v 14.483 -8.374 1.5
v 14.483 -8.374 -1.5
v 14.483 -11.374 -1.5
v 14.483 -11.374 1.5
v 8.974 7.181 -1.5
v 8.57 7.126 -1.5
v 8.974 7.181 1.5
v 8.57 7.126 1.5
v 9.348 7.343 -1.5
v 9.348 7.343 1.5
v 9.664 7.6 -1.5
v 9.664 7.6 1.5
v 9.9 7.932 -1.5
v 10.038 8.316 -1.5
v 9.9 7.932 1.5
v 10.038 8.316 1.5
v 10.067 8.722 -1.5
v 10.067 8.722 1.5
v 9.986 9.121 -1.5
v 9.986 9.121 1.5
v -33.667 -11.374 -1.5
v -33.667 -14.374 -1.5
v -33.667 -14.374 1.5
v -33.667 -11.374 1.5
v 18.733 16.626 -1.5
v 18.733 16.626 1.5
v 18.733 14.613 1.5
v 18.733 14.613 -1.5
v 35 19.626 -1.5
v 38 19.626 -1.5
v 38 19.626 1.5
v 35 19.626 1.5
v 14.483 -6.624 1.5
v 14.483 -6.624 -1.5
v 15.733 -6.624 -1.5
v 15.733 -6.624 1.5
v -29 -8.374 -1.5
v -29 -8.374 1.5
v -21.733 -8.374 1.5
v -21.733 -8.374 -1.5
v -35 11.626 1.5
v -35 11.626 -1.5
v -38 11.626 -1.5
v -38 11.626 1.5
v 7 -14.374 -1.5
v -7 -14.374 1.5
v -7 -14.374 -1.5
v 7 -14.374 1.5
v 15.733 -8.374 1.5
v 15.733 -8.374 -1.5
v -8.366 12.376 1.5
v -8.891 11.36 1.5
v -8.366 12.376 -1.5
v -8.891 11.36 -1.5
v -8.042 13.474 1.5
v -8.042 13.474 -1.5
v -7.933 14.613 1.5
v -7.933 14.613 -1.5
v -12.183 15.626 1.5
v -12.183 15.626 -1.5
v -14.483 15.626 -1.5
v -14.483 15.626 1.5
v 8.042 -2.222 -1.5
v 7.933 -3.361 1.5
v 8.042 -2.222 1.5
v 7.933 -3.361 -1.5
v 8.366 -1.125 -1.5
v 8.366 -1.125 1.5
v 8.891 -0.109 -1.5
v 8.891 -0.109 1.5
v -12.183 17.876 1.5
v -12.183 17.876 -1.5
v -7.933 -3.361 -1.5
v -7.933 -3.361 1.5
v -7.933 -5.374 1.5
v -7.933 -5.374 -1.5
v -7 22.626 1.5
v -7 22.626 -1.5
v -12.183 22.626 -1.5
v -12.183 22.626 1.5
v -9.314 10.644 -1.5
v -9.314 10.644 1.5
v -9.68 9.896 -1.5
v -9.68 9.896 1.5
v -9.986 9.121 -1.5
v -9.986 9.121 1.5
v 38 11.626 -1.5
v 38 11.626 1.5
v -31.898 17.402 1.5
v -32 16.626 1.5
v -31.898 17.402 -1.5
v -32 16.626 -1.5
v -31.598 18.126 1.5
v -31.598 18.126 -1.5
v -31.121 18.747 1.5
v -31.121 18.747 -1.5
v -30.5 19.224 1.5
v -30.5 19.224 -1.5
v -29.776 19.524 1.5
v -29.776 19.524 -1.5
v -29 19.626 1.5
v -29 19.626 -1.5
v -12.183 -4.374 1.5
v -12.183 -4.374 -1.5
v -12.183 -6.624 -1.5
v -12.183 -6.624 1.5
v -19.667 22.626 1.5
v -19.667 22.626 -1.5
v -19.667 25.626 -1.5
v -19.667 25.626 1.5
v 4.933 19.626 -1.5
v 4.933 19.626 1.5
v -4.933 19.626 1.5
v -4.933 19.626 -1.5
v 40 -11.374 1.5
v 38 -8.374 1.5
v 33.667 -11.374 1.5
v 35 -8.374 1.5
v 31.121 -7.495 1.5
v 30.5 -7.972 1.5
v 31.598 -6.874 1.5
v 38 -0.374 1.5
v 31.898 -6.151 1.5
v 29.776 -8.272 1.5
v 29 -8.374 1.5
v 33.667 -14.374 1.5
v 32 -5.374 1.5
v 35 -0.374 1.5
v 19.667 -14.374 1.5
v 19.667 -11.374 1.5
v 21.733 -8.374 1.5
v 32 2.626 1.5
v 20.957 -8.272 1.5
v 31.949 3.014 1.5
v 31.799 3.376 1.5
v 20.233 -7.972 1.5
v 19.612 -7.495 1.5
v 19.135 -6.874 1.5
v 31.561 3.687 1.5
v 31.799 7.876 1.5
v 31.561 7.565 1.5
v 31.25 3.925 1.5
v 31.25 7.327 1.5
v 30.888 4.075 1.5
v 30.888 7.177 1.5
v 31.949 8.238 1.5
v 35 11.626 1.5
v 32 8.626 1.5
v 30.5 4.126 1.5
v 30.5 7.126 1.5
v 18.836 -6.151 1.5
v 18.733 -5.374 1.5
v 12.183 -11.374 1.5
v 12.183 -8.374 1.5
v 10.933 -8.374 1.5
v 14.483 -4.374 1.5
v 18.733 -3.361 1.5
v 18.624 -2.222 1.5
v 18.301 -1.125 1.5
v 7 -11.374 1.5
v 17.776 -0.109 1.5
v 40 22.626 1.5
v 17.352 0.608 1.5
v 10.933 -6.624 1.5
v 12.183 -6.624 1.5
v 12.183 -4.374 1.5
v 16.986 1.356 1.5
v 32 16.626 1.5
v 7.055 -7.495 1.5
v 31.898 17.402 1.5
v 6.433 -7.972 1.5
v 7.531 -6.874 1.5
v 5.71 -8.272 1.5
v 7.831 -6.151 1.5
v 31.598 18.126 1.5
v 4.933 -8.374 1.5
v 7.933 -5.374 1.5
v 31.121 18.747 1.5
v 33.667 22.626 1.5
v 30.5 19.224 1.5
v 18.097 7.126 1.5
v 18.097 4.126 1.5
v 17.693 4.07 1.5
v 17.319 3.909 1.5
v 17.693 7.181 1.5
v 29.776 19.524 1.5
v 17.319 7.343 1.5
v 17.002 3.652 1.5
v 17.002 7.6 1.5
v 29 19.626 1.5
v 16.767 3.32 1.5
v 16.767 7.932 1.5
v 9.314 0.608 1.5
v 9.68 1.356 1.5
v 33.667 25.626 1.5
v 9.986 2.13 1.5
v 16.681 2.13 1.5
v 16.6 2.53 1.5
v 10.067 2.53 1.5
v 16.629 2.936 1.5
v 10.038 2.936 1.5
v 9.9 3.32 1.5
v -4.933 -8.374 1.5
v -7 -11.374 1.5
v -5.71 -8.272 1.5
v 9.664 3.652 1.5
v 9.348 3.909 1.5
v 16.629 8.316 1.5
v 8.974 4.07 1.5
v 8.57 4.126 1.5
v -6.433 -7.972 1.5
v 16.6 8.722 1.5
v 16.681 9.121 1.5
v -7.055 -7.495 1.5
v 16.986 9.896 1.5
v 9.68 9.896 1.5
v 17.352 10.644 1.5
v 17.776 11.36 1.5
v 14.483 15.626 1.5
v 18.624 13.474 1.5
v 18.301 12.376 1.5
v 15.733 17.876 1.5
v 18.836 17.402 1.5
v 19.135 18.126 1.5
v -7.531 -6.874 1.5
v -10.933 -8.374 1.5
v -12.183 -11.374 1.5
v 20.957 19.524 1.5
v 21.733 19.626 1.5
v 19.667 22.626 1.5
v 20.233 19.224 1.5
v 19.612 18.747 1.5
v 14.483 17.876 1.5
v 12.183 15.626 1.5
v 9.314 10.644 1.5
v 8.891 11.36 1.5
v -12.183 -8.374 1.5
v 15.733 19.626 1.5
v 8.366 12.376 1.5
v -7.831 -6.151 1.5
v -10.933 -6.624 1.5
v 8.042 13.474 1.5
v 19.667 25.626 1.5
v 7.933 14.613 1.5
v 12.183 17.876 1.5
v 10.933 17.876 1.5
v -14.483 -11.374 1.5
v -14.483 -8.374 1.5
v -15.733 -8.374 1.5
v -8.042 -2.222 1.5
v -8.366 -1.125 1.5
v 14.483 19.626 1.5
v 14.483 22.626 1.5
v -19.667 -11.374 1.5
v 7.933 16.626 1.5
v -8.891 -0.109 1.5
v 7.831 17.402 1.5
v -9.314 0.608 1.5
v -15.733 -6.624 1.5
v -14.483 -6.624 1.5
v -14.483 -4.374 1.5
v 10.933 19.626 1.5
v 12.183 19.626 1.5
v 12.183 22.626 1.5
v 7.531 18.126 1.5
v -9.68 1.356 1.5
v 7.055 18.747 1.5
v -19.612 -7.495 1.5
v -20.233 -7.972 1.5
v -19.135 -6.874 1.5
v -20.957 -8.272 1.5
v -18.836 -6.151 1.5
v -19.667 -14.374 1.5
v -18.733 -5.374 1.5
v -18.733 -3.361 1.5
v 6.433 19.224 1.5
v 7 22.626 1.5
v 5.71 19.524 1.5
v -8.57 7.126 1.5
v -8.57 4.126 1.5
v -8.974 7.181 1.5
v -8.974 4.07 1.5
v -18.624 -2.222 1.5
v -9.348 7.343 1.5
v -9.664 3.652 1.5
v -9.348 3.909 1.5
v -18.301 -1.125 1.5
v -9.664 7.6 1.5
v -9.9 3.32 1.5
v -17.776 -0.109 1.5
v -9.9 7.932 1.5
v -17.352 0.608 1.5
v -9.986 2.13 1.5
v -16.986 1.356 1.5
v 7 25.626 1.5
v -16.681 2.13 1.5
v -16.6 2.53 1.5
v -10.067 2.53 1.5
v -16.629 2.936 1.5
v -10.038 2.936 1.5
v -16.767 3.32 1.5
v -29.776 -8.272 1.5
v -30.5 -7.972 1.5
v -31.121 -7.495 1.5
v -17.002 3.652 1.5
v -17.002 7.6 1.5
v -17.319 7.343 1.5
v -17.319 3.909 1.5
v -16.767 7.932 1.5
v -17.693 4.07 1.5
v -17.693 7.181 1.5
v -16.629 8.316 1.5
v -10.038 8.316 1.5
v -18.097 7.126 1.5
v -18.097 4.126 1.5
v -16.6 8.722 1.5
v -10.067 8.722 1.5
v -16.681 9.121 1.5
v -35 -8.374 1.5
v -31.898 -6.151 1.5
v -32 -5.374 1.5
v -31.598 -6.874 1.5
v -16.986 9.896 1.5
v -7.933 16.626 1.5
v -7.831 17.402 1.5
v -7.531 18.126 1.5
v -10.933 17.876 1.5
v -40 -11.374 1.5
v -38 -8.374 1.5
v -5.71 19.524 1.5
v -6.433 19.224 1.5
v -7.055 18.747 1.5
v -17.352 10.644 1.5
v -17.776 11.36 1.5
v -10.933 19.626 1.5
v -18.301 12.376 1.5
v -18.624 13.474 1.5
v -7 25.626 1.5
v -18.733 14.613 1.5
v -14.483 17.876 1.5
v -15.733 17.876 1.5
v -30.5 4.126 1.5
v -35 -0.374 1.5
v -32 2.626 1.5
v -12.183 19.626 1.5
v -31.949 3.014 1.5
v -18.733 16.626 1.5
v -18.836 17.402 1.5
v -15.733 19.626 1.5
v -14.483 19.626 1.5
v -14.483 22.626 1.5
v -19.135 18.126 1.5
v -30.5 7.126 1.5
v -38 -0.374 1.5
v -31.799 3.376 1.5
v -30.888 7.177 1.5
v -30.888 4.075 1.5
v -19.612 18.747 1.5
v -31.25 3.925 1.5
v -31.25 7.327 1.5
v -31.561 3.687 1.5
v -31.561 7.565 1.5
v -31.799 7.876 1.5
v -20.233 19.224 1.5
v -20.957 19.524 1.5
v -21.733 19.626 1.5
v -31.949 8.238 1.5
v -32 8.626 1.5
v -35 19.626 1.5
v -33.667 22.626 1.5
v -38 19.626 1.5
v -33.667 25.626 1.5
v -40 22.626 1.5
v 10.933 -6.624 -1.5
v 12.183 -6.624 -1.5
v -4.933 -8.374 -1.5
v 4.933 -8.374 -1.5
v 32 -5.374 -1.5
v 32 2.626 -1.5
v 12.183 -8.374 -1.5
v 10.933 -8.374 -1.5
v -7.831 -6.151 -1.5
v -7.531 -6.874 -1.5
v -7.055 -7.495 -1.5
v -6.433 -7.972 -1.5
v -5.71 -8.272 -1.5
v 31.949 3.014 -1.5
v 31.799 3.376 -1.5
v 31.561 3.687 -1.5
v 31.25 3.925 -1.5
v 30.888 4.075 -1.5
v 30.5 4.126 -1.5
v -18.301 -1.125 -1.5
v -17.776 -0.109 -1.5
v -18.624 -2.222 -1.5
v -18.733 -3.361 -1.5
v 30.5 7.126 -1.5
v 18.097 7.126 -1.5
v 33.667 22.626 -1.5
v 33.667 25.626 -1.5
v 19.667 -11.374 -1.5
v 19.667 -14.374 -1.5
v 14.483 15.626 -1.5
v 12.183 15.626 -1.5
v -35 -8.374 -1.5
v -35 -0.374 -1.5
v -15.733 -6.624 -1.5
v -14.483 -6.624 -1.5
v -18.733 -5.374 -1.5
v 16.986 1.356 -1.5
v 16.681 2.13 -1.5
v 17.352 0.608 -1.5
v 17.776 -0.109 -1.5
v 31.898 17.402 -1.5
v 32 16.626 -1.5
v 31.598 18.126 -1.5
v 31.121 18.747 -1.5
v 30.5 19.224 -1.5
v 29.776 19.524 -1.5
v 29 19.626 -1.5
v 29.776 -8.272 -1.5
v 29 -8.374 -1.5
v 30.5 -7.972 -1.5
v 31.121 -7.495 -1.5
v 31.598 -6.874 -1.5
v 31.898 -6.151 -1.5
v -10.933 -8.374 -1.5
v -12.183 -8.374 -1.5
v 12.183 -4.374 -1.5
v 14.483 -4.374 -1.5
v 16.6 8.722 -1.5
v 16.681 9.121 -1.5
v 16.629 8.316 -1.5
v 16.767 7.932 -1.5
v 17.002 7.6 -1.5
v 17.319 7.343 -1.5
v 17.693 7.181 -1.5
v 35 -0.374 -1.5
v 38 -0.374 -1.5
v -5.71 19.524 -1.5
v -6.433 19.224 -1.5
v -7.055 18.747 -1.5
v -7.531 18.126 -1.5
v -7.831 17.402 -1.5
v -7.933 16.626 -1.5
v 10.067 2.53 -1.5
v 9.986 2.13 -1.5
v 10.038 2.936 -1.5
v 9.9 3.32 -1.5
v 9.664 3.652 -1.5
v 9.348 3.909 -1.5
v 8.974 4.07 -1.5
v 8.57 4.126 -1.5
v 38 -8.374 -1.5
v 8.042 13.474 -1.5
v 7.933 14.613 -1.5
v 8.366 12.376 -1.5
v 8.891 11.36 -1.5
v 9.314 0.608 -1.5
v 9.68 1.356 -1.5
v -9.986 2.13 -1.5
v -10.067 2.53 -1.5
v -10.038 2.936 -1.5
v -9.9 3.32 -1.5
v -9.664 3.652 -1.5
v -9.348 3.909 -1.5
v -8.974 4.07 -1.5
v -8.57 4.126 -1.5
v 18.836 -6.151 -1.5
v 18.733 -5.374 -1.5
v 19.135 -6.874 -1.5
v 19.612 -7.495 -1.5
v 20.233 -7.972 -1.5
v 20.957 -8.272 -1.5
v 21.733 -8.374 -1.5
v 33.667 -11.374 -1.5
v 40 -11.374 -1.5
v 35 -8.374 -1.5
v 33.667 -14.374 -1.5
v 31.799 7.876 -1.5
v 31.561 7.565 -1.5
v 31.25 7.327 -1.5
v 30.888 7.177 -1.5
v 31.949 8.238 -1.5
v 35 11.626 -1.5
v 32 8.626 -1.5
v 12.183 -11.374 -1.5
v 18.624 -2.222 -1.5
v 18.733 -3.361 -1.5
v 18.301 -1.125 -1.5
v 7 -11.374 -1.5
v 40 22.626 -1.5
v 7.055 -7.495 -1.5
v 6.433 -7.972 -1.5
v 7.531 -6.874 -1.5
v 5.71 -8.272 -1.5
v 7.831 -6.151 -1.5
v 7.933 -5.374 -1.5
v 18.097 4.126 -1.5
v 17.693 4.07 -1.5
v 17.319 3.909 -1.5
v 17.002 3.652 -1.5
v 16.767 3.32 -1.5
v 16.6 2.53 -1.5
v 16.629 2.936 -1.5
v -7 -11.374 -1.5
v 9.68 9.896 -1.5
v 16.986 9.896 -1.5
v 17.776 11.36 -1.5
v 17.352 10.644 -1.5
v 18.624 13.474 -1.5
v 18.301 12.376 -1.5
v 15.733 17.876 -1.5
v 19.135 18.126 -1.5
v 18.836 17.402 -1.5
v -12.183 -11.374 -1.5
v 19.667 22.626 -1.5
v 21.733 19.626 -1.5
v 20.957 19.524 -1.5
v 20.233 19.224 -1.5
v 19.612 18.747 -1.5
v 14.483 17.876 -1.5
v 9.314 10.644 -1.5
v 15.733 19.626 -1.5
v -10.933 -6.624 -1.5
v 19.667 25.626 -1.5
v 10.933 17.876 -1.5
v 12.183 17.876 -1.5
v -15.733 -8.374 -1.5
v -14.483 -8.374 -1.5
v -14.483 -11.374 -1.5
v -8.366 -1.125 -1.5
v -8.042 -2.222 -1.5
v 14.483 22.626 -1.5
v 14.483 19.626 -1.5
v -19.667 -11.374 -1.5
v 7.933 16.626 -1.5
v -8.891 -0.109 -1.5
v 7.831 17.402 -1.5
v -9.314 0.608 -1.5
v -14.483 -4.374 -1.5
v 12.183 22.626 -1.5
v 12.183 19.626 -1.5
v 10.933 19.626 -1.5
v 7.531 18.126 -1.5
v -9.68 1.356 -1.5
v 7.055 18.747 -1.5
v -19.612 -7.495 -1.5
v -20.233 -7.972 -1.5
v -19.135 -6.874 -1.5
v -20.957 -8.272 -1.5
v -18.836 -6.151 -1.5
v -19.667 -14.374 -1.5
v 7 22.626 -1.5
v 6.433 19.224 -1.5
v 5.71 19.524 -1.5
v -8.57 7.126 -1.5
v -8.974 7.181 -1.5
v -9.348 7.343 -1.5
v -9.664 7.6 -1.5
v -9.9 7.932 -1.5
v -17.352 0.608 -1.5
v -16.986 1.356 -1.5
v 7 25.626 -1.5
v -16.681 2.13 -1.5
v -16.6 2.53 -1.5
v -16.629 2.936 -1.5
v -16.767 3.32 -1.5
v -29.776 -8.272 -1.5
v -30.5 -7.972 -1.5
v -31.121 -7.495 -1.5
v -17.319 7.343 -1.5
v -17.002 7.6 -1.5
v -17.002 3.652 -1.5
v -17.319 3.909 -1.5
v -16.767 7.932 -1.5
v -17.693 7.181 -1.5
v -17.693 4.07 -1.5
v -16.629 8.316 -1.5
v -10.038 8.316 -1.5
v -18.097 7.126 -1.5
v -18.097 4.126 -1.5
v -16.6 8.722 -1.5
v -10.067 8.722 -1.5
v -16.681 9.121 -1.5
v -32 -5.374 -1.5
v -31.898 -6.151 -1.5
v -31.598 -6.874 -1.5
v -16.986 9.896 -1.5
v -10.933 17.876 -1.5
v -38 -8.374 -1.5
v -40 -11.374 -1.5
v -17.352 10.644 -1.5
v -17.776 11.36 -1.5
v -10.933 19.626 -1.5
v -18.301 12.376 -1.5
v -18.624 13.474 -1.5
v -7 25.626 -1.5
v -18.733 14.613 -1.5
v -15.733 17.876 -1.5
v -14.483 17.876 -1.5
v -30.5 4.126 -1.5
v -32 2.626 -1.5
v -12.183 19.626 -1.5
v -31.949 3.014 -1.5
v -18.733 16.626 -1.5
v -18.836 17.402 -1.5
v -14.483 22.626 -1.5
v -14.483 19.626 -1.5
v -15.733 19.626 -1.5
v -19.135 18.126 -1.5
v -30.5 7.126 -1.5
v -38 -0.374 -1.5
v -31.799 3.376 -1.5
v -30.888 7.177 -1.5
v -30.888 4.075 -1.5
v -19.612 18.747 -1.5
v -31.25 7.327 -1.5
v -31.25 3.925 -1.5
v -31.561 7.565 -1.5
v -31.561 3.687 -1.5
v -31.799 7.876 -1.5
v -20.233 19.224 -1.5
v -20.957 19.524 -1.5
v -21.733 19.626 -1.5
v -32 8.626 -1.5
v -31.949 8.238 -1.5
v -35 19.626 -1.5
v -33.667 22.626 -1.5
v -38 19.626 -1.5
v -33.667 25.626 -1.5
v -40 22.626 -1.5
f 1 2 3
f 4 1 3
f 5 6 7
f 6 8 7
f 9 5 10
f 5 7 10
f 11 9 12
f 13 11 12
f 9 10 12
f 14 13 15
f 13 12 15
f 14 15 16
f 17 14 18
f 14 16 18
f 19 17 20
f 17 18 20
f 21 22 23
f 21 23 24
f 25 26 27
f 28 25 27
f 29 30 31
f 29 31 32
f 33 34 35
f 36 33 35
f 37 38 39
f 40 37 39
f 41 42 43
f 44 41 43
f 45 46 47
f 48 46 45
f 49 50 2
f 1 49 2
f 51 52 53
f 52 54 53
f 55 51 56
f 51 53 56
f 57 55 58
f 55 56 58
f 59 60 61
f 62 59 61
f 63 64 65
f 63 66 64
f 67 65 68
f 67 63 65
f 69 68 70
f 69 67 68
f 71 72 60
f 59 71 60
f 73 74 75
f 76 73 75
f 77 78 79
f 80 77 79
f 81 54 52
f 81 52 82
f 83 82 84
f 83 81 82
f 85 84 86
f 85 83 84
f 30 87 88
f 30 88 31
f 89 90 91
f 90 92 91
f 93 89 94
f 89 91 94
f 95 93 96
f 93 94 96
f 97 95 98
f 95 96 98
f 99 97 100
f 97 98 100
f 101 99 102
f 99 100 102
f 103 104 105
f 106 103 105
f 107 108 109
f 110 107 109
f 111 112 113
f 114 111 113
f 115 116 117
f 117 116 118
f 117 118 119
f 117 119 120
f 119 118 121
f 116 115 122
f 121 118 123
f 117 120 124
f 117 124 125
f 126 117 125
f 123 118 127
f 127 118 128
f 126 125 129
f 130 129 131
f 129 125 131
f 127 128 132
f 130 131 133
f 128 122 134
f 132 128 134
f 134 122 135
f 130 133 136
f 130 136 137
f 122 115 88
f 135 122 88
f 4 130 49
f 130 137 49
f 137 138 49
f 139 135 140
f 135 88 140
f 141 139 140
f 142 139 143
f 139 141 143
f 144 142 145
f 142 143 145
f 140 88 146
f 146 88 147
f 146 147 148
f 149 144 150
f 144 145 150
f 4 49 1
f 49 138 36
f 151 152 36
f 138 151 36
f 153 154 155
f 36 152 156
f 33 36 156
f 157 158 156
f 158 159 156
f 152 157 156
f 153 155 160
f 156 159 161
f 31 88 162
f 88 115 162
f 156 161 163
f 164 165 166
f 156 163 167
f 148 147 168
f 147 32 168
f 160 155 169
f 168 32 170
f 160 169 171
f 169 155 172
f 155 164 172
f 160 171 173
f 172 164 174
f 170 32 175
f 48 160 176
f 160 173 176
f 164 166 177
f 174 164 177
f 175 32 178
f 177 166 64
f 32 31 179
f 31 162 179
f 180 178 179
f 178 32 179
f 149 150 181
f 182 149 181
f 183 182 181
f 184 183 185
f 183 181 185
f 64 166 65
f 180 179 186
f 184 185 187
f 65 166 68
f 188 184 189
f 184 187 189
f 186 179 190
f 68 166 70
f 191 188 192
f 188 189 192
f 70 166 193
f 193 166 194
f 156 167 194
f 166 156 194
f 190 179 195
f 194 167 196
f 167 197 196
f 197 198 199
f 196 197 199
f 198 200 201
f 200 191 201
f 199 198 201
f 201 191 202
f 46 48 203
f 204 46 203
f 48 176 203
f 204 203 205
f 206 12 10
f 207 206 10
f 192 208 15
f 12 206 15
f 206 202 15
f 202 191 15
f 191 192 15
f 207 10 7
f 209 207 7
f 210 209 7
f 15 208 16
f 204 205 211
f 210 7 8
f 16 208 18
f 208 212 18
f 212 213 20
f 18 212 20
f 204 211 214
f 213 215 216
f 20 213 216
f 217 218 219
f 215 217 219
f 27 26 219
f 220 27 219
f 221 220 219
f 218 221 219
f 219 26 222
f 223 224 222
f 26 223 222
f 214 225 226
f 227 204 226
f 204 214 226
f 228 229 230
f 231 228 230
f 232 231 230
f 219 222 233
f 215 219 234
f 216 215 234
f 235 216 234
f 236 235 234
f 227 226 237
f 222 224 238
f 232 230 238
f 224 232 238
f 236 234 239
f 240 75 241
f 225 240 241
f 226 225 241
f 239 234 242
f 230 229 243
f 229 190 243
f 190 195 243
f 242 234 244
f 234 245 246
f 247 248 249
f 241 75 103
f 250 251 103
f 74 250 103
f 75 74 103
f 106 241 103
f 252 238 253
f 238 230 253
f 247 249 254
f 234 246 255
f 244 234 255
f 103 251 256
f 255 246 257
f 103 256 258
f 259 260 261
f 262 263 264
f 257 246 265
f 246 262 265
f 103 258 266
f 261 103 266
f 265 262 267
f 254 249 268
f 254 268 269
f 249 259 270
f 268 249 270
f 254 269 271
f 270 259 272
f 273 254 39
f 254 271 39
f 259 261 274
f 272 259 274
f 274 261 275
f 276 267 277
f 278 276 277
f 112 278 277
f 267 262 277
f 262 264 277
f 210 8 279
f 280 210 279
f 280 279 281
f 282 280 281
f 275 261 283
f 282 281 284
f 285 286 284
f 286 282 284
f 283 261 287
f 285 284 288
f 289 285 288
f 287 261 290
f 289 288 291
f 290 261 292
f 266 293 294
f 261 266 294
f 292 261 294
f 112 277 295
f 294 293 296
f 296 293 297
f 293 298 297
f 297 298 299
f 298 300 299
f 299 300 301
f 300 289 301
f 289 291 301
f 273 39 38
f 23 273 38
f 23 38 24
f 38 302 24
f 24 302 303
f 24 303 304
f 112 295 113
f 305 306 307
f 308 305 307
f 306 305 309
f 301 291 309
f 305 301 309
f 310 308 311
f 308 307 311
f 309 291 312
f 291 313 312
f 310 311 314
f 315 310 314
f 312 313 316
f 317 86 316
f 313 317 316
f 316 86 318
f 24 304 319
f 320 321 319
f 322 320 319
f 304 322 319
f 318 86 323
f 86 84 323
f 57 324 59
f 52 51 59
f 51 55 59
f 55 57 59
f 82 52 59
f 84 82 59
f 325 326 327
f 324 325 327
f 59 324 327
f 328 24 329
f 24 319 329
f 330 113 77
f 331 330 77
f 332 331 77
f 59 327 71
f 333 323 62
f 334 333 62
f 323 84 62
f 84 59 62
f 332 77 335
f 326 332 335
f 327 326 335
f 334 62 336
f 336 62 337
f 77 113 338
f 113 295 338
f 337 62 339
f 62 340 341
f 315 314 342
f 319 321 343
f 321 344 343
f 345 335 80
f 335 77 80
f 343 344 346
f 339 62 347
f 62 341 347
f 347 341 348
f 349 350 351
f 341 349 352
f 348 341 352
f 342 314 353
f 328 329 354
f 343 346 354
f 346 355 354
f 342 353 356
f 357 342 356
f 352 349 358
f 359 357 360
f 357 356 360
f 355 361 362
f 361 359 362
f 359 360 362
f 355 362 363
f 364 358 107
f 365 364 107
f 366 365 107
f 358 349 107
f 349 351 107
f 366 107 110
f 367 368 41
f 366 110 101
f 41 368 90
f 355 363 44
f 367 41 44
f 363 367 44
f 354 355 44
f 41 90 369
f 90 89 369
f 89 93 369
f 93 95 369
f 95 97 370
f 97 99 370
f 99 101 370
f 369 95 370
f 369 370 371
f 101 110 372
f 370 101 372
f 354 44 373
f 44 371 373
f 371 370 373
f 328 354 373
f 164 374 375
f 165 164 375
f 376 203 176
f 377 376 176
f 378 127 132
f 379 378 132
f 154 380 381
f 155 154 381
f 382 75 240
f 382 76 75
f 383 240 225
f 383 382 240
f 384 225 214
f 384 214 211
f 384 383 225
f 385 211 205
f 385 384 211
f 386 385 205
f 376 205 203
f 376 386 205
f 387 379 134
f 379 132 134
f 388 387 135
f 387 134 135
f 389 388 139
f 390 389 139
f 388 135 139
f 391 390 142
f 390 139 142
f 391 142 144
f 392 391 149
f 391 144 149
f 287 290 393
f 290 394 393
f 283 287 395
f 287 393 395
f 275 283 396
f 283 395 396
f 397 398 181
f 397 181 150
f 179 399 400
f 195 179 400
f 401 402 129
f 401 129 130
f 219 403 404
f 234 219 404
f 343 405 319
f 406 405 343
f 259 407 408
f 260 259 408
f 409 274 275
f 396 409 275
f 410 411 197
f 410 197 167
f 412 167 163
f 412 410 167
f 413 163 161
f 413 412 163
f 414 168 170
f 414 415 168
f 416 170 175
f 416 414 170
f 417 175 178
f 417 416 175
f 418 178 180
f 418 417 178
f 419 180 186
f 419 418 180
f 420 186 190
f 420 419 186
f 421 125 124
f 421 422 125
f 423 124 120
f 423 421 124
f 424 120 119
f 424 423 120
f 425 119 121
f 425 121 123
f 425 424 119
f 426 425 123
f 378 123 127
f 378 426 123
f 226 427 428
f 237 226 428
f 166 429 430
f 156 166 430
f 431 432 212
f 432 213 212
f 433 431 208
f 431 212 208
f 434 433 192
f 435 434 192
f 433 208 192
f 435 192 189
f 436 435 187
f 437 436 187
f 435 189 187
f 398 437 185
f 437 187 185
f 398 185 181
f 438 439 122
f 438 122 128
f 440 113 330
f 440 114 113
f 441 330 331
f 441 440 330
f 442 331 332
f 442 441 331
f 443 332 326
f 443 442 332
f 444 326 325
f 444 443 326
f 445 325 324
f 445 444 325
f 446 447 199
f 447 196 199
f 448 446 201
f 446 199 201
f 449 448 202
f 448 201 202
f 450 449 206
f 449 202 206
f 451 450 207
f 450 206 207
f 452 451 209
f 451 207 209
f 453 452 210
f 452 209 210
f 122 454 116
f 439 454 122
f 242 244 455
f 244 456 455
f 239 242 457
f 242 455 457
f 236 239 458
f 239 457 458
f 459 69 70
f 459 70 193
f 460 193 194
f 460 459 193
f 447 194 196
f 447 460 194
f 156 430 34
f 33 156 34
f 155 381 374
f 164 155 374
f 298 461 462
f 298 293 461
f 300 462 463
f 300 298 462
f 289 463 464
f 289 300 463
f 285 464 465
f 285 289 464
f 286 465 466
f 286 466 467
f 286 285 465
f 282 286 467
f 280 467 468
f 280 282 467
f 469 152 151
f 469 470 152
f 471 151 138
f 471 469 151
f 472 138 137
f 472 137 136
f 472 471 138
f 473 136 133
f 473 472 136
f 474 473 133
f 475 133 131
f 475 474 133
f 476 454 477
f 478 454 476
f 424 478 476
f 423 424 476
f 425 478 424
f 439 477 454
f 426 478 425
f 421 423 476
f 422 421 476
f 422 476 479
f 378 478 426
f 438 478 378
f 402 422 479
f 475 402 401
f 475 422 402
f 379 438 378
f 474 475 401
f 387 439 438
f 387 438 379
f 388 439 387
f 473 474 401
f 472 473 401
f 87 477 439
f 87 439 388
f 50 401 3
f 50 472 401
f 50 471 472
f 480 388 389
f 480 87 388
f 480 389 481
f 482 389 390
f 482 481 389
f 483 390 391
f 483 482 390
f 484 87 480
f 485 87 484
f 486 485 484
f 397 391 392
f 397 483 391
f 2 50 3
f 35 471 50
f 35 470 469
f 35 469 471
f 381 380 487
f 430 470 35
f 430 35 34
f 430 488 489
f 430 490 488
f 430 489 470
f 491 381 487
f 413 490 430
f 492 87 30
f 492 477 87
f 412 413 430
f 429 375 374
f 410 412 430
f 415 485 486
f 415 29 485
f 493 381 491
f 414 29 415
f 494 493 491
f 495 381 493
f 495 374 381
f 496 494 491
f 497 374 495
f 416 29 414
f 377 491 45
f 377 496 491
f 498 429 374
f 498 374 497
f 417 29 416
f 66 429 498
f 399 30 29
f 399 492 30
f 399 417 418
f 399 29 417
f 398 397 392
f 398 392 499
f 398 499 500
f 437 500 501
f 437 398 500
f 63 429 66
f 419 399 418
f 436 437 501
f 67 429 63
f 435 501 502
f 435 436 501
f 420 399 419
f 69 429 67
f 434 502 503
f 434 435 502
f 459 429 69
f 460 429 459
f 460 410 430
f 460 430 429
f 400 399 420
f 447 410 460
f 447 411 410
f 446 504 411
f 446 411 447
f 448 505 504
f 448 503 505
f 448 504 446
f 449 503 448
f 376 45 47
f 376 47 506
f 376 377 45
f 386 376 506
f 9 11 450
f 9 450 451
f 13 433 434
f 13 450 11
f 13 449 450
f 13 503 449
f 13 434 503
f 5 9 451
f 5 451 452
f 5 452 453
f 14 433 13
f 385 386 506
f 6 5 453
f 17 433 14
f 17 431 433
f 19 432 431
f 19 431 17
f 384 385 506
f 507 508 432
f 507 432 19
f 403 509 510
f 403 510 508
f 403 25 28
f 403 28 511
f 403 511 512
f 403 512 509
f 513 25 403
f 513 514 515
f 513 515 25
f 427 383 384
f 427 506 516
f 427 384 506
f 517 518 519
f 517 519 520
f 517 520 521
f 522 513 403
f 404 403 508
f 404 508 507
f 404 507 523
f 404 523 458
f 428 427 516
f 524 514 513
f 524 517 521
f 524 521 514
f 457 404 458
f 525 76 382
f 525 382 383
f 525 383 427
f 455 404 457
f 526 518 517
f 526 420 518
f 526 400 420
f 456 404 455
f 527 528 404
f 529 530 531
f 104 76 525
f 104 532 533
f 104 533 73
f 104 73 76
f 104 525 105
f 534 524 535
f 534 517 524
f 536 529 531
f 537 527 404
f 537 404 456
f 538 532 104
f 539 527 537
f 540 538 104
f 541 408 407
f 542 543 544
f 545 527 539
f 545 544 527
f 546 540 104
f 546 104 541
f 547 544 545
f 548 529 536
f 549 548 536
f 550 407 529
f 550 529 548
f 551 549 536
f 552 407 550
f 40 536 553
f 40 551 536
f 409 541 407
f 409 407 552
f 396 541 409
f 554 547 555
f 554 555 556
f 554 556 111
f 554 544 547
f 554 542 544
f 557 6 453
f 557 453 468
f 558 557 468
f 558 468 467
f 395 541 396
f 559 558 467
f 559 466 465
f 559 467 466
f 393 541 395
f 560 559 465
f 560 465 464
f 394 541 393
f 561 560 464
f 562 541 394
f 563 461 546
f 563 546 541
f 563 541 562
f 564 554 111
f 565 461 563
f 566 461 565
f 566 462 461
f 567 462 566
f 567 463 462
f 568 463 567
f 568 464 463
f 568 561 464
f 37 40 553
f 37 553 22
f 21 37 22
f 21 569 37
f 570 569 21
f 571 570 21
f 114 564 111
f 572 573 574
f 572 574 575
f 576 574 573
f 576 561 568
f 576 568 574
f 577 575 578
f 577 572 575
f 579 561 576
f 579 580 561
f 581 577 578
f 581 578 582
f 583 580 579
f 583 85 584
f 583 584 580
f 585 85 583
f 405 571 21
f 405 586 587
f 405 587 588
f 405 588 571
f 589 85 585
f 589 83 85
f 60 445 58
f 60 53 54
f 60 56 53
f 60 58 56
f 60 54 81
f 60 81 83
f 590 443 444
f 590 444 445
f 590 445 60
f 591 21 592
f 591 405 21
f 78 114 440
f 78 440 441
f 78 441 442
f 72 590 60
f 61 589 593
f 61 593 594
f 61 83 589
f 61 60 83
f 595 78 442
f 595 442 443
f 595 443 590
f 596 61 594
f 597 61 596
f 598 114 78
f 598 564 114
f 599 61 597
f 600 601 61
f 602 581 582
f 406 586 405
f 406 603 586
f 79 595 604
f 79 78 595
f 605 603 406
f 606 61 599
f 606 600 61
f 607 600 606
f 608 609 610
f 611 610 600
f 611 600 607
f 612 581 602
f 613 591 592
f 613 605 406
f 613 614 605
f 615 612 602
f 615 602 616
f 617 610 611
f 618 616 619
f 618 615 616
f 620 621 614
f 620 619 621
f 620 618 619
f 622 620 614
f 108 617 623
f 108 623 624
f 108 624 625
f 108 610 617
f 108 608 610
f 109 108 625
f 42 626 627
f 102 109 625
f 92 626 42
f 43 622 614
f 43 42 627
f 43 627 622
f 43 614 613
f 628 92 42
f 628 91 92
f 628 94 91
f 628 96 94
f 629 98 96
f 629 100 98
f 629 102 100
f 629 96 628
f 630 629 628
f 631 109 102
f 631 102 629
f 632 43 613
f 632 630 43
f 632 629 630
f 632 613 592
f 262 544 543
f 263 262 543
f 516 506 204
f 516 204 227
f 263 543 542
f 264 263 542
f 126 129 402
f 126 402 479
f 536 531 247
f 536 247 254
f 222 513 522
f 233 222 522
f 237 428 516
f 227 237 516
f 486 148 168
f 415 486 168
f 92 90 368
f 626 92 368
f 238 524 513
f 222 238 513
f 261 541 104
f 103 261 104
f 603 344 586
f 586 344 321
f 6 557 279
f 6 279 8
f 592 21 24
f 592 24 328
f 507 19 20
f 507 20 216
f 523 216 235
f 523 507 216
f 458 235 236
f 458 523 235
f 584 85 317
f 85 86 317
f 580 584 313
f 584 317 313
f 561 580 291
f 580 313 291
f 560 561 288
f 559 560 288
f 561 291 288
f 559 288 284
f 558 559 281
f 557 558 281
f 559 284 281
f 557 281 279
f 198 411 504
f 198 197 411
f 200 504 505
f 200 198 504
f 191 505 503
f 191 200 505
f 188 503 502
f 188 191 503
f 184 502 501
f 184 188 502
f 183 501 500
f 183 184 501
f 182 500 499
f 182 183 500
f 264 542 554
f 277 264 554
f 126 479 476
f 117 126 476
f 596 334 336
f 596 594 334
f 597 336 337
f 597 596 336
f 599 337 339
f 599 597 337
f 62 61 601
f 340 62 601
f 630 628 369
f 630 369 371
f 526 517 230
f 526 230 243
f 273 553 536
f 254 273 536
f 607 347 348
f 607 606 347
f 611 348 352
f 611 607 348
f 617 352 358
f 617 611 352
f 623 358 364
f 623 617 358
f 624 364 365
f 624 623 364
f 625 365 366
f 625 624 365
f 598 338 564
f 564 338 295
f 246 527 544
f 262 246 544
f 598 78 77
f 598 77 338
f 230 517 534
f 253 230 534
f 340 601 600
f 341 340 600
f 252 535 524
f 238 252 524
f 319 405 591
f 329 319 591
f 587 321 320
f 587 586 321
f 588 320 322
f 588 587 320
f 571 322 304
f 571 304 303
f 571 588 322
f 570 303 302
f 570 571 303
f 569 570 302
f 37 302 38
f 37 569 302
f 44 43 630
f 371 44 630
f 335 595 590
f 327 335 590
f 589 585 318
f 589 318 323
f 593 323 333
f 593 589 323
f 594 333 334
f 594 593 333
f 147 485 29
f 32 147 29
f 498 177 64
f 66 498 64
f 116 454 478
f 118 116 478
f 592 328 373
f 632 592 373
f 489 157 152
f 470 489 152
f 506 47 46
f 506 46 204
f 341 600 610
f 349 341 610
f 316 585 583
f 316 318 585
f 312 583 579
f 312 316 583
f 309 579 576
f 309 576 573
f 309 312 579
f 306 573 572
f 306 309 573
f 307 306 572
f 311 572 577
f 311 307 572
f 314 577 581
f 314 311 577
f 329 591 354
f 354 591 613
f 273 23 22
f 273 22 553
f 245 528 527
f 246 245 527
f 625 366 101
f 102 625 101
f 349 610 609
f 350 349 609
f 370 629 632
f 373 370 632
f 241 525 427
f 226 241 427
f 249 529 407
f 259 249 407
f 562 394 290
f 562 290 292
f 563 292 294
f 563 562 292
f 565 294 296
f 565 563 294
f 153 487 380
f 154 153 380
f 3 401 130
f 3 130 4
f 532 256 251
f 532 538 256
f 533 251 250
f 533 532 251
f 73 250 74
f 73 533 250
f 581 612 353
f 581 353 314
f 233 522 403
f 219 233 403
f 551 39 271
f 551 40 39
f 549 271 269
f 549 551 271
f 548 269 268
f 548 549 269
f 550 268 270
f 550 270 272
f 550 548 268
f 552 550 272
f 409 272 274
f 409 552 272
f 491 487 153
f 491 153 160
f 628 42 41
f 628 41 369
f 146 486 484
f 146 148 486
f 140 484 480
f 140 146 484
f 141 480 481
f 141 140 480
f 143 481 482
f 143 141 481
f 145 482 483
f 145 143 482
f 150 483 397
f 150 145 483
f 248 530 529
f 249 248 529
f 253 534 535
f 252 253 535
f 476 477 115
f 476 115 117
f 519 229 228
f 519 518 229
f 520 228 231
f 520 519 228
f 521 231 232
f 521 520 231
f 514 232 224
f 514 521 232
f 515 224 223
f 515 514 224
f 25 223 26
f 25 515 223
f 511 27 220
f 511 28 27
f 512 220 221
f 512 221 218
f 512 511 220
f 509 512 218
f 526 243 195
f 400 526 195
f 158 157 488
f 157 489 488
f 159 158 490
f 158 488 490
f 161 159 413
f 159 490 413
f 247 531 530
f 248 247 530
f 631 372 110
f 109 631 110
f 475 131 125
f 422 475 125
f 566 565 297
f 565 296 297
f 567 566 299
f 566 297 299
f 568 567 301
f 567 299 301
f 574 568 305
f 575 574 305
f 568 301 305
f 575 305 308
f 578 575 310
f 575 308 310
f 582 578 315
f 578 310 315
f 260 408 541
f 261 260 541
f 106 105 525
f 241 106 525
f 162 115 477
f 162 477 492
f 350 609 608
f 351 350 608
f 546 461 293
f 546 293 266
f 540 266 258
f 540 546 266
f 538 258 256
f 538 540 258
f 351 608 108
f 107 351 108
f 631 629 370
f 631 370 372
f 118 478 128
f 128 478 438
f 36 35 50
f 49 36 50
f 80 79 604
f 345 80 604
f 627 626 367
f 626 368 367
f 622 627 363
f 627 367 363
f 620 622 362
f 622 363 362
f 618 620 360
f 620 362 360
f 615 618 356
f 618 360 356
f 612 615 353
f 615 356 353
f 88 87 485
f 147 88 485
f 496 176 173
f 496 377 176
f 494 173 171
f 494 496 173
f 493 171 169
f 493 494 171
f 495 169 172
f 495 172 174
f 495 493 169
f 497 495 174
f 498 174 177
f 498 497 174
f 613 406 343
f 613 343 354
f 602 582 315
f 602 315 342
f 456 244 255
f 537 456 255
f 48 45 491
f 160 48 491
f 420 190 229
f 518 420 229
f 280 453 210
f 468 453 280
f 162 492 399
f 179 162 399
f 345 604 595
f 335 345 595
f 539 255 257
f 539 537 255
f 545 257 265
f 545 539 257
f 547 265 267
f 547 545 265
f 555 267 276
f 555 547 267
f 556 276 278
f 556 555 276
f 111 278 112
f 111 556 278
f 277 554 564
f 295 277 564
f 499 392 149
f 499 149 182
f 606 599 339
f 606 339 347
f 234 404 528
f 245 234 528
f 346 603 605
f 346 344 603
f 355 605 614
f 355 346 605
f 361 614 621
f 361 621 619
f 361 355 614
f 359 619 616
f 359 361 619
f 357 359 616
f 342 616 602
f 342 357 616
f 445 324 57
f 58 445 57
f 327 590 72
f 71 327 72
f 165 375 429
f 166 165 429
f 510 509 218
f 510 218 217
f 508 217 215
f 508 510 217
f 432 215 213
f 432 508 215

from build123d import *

# Parameters (mm, degrees)
SKETCH1_W           = 80
SKETCH1_H           = 40
BOSS_EXTRUDE1_DEPTH = 1.5
SKETCH3_W           = 6.333333333
SKETCH3_H           = 3
SKETCH3_W_2         = 12.666666667
CUT_EXTRUDE1_DEPTH  = 3
CUT_EXTRUDE3_DEPTH  = 3
SKETCH5_W           = 3
SKETCH5_H           = 8
CUT_EXTRUDE4_DEPTH  = 3
CUT_EXTRUDE6_DEPTH  = 3
FILLET1_R           = 3
BOSS_EXTRUDE2_START = -3
BOSS_EXTRUDE2_DEPTH = 3
FILLET2_R           = 6
BOSS_EXTRUDE3_START = -3
BOSS_EXTRUDE3_DEPTH = 3
FILLET3_R           = 1.5


with BuildPart() as part:
    # Sketch1 → Boss-Extrude1 (new body, symmetric)
    with BuildSketch(Plane.XY):
        with Locations((0, 5.625841184)):
            Rectangle(SKETCH1_W, SKETCH1_H)
    extrude(amount=BOSS_EXTRUDE1_DEPTH, both=True)

    # Sketch3 → Cut-Extrude1 (cut)
    with BuildSketch(Plane(origin=(0, 0, -1.5), x_dir=(-1, 0, 0), z_dir=(0, 0, -1))):
        with Locations((-36.833333334, 24.125841184)):
            Rectangle(SKETCH3_W, SKETCH3_H)
        with Locations((-13.333333334, 24.125841184)):
            Rectangle(SKETCH3_W_2, SKETCH3_H)
        with Locations((13.333333334, 24.125841184)):
            Rectangle(SKETCH3_W_2, SKETCH3_H)
        with Locations((36.833333334, 24.125841184)):
            Rectangle(SKETCH3_W, SKETCH3_H)
        with Locations((-36.833333334, -12.874158816)):
            Rectangle(SKETCH3_W, SKETCH3_H)
        with Locations((-13.333333334, -12.874158816)):
            Rectangle(SKETCH3_W_2, SKETCH3_H)
        with Locations((36.833333334, -12.874158816)):
            Rectangle(SKETCH3_W, SKETCH3_H)
        with Locations((13.333333334, -12.874158816)):
            Rectangle(SKETCH3_W_2, SKETCH3_H)
    extrude(amount=-CUT_EXTRUDE1_DEPTH, mode=Mode.SUBTRACT)

    # Sketch4 → Cut-Extrude3 (cut)
    with BuildSketch(Plane(origin=(0, 0, -1.5), x_dir=(-1, 0, 0), z_dir=(0, 0, -1))):
        Polygon((10.933333333, 17.875841184), (12.183333333, 17.875841184), (12.183333333, 15.625841184), (14.483333333, 15.625841184), (14.483333333, 17.875841184), (15.733333333, 17.875841184), (15.733333333, 19.625841184), (14.483333333, 19.625841184), (14.483333333, 22.625841184), (12.183333333, 22.625841184), (12.183333333, 19.625841184), (10.933333333, 19.625841184), align=None)
        Polygon((-12.183333333, 22.625841184), (-14.483333333, 22.625841184), (-14.483333333, 19.625841184), (-15.733333333, 19.625841184), (-15.733333333, 17.875841184), (-14.483333333, 17.875841184), (-14.483333333, 15.625841184), (-12.183333333, 15.625841184), (-12.183333333, 17.875841184), (-10.933333333, 17.875841184), (-10.933333333, 19.625841184), (-12.183333333, 19.625841184), align=None)
        Polygon((-10.933333333, -6.624158816), (-12.183333333, -6.624158816), (-12.183333333, -4.374158816), (-14.483333333, -4.374158816), (-14.483333333, -6.624158816), (-15.733333333, -6.624158816), (-15.733333333, -8.374158816), (-14.483333333, -8.374158816), (-14.483333333, -11.374158816), (-12.183333333, -11.374158816), (-12.183333333, -8.374158816), (-10.933333333, -8.374158816), align=None)
        Polygon((12.183333333, -11.374158816), (14.483333333, -11.374158816), (14.483333333, -8.374158816), (15.733333333, -8.374158816), (15.733333333, -6.624158816), (14.483333333, -6.624158816), (14.483333333, -4.374158816), (12.183333333, -4.374158816), (12.183333333, -6.624158816), (10.933333333, -6.624158816), (10.933333333, -8.374158816), (12.183333333, -8.374158816), align=None)
    extrude(amount=-CUT_EXTRUDE3_DEPTH, mode=Mode.SUBTRACT)

    # Sketch5 → Cut-Extrude4 (cut)
    with BuildSketch(Plane(origin=(0, 0, -1.5), x_dir=(-1, 0, 0), z_dir=(0, 0, -1))):
        with Locations((36.5, -4.374158816)):
            Rectangle(SKETCH5_W, SKETCH5_H)
        with Locations((36.5, 15.625841184)):
            Rectangle(SKETCH5_W, SKETCH5_H)
        with Locations((-36.5, 15.625841184)):
            Rectangle(SKETCH5_W, SKETCH5_H)
        with Locations((-36.5, -4.374158816)):
            Rectangle(SKETCH5_W, SKETCH5_H)
    extrude(amount=-CUT_EXTRUDE4_DEPTH, mode=Mode.SUBTRACT)

    # Sketch7 → Cut-Extrude6 (cut)
    with BuildSketch(Plane.XY.offset(1.5)):
        Polygon((-32, 19.625841184), (-32, -8.374158816), (-18.733333333, -8.374158816), (-18.733333333, -1.374158816), (-7.933333333, -1.374158816), (-7.933333333, -8.374158816), (7.933333333, -8.374158816), (7.933333333, -1.374158816), (18.733333333, -1.374158816), (18.733333333, -8.374158816), (32, -8.374158816), (32, 19.625841184), (18.733333333, 19.625841184), (18.733333333, 12.625841184), (7.933333333, 12.625841184), (7.933333333, 19.625841184), (-7.933333333, 19.625841184), (-7.933333333, 12.625841184), (-18.733333333, 12.625841184), (-18.733333333, 19.625841184), align=None)
    extrude(amount=-CUT_EXTRUDE6_DEPTH, mode=Mode.SUBTRACT)

    # Fillet1
    fillet1_edges = [part.edges().sort_by_distance(p)[0] for p in [
        (-32, 19.625841184, 0),
        (-18.733333333, 19.625841184, 0),
        (-7.933333333, 19.625841184, 0),
        (7.933333333, 19.625841184, 0),
        (18.733333333, 19.625841184, 0),
        (32, 19.625841184, 0),
        (32, -8.374158816, 0),
        (18.733333333, -8.374158816, 0),
        (7.933333333, -8.374158816, 0),
        (-7.933333333, -8.374158816, 0),
        (-18.733333333, -8.374158816, 0),
        (-32, -8.374158816, 0),
    ]]
    fillet(fillet1_edges, radius=FILLET1_R)

    # Sketch8 → Boss-Extrude2 (add)
    with BuildSketch(Plane.XY.offset(1.5).offset(BOSS_EXTRUDE2_START)):
        with BuildLine():
            Line((-18.733333333, 12.625841184), (-7.933333333, 12.625841184))
            ThreePointArc((-7.933333333, 12.625841184), (-10.580065112, 5.625841184), (-7.933333333, -1.374158816))
            Line((-7.933333333, -1.374158816), (-18.733333333, -1.374158816))
            ThreePointArc((-18.733333333, -1.374158816), (-16.086601554, 5.625841184), (-18.733333333, 12.625841184))
        make_face()
        with BuildLine():
            Line((7.933333333, 12.625841184), (18.733333333, 12.625841184))
            ThreePointArc((18.733333333, 12.625841184), (16.086601554, 5.625841184), (18.733333333, -1.374158816))
            Line((18.733333333, -1.374158816), (7.933333333, -1.374158816))
            ThreePointArc((7.933333333, -1.374158816), (10.580065112, 5.625841184), (7.933333333, 12.625841184))
        make_face()
    extrude(amount=BOSS_EXTRUDE2_DEPTH)

    # Fillet2
    fillet2_edges = [part.edges().sort_by_distance(p)[0] for p in [
        (-18.733333333, 12.625841184, 0),
        (-7.933333333, 12.625841184, 0),
        (7.933333333, 12.625841184, 0),
        (18.733333333, 12.625841184, 0),
        (18.733333333, -1.374158816, 0),
        (7.933333333, -1.374158816, 0),
        (-7.933333333, -1.374158816, 0),
        (-18.733333333, -1.374158816, 0),
    ]]
    fillet(fillet2_edges, radius=FILLET2_R)

    # Sketch9 → Boss-Extrude3 (add)
    with BuildSketch(Plane.XY.offset(1.5).offset(BOSS_EXTRUDE3_START)):
        with BuildLine():
            Line((-32, 7.125841184), (-16.193473372, 7.125841184))
            ThreePointArc((-16.193473372, 7.125841184), (-16.086601554, 5.625841184), (-16.193473372, 4.125841184))
            Line((-16.193473372, 4.125841184), (-32, 4.125841184))
            Line((-32, 4.125841184), (-32, 7.125841184))
        make_face()
        with BuildLine():
            Line((-10.473193294, 7.125841184), (10.473193294, 7.125841184))
            ThreePointArc((10.473193294, 7.125841184), (10.580065112, 5.625841184), (10.473193294, 4.125841184))
            Line((10.473193294, 4.125841184), (-10.473193294, 4.125841184))
            ThreePointArc((-10.473193294, 4.125841184), (-10.580065112, 5.625841184), (-10.473193294, 7.125841184))
        make_face()
        with BuildLine():
            Line((16.193473372, 7.125841184), (32, 7.125841184))
            Line((32, 7.125841184), (32, 4.125841184))
            Line((32, 4.125841184), (16.193473372, 4.125841184))
            ThreePointArc((16.193473372, 4.125841184), (16.086601554, 5.625841184), (16.193473372, 7.125841184))
        make_face()
    extrude(amount=BOSS_EXTRUDE3_DEPTH)

    # Fillet3
    fillet3_edges = [part.edges().sort_by_distance(p)[0] for p in [
        (-32, 4.125841184, 0),
        (-32, 7.125841184, 0),
        (-16.193473372, 7.125841184, 0),
        (-16.193473372, 4.125841184, 0),
        (-10.473193294, 4.125841184, 0),
        (-10.473193294, 7.125841184, 0),
        (10.473193294, 7.125841184, 0),
        (10.473193294, 4.125841184, 0),
        (16.193473372, 4.125841184, 0),
        (16.193473372, 7.125841184, 0),
        (32, 7.125841184, 0),
        (32, 4.125841184, 0),
    ]]
    fillet(fillet3_edges, radius=FILLET3_R)


solid = part.part
